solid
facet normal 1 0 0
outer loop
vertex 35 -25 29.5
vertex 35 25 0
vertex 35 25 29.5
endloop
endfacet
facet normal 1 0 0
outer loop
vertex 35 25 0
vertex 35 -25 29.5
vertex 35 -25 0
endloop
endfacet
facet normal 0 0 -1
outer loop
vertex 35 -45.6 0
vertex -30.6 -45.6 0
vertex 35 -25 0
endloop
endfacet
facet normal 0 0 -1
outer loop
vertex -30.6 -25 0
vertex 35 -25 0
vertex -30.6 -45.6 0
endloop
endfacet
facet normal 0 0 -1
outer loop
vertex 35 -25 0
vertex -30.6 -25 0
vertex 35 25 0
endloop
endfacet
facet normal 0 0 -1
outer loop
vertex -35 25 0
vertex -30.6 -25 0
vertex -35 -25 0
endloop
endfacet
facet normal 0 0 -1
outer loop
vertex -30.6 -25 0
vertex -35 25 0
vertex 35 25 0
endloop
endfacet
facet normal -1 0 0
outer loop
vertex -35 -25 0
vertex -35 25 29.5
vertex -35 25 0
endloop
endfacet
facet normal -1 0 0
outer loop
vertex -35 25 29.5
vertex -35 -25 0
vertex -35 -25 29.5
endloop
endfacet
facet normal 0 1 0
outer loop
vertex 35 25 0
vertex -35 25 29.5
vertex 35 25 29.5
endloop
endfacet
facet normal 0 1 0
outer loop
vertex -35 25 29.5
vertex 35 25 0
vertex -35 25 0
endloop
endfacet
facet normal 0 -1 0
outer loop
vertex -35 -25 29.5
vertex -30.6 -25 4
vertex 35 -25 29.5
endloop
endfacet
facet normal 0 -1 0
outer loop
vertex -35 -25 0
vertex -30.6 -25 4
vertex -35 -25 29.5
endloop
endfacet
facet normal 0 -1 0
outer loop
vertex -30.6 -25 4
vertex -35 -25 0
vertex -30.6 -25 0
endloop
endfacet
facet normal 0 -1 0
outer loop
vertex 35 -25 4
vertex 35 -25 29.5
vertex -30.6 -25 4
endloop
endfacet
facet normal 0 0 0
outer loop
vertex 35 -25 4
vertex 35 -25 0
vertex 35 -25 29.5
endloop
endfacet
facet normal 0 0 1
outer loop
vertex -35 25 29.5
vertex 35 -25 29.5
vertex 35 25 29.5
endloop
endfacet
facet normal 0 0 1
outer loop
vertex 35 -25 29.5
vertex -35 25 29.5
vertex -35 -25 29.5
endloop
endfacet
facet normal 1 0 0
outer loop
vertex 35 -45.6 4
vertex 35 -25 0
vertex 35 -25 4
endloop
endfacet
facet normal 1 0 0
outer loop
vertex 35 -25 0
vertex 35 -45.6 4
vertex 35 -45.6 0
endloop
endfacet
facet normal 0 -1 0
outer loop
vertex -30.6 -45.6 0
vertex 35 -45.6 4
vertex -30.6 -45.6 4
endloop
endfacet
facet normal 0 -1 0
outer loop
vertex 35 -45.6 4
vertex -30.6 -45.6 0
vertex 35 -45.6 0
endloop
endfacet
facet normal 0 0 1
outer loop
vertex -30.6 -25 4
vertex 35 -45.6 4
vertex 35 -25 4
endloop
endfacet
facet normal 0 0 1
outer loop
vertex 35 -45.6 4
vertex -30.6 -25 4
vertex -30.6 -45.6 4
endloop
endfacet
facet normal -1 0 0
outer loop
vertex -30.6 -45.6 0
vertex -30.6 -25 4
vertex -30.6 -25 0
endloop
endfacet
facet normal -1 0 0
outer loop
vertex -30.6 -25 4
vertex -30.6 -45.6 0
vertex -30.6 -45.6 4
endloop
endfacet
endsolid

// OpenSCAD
// Two-part enclosure for a small electronics board (e.g. Arduino-based temperature logger)
// Print orientation: box on the bed, lid on the +X side of the box, both resting on XY (z = 0)

// ---------------- Parameters ----------------
box_x      = 70;    // box outer length (X)
box_y      = 50;    // box outer width (Y)
box_z      = 30;    // box outer height (Z)
box_wall   = 2;     // box wall thickness (sides and floor)

lip_t      = 1.5;   // lid lip thickness (X)
lip_h      = 4;     // lid lip height (Z)
lip_x      = 65.6;  // lid lip outer length (X)
lip_y      = 45.6;  // lid lip outer width (Y)
lip_wall   = 1.5;   // lid lip wall thickness

eps        = 0.5;   // cutter overshoot past faces

$fn = 64;

// ---------------- Derived ----------------
box_fitting_x = box_x - 2 * box_wall;   // 66
box_fitting_y = box_y - 2 * box_wall;   // 46
lip_clear     = 0.2;                    // clearance of lip inside box opening

// ---------------- Model ----------------
union() {
    // Box: outer block with open top (floor, front, back, left, right walls)
    difference() {
        translate([-box_x / 2, -box_y / 2, 0])
            cube([box_x, box_y, box_z]);
        // Open top cut, extended past the top face
        translate([-box_x / 2, -box_y / 2, box_z - eps])
            cube([box_x, box_y, eps]);
    }

    // Lid: plate on the bed with a rectangular lip on top, centred on the plate
    // The lip is a solid block of size [lip_x, lip_y, lip_h] with a [lip_wall] border;
    // its inner opening is [lip_x - 2 * lip_wall, lip_y - 2 * lip_wall],
    // which gives 0.2 mm clearance on each side relative to the box opening.
    translate([(box_x - lip_x) / 2, -lip_y / 2, 0])
        linear_extrude(height = lip_h)
            polygon([
                [-lip_x / 2, -lip_y / 2],
                [ lip_x / 2, -lip_y / 2],
                [ lip_x / 2,  lip_y / 2],
                [-lip_x / 2,  lip_y / 2]
            ]);
}
